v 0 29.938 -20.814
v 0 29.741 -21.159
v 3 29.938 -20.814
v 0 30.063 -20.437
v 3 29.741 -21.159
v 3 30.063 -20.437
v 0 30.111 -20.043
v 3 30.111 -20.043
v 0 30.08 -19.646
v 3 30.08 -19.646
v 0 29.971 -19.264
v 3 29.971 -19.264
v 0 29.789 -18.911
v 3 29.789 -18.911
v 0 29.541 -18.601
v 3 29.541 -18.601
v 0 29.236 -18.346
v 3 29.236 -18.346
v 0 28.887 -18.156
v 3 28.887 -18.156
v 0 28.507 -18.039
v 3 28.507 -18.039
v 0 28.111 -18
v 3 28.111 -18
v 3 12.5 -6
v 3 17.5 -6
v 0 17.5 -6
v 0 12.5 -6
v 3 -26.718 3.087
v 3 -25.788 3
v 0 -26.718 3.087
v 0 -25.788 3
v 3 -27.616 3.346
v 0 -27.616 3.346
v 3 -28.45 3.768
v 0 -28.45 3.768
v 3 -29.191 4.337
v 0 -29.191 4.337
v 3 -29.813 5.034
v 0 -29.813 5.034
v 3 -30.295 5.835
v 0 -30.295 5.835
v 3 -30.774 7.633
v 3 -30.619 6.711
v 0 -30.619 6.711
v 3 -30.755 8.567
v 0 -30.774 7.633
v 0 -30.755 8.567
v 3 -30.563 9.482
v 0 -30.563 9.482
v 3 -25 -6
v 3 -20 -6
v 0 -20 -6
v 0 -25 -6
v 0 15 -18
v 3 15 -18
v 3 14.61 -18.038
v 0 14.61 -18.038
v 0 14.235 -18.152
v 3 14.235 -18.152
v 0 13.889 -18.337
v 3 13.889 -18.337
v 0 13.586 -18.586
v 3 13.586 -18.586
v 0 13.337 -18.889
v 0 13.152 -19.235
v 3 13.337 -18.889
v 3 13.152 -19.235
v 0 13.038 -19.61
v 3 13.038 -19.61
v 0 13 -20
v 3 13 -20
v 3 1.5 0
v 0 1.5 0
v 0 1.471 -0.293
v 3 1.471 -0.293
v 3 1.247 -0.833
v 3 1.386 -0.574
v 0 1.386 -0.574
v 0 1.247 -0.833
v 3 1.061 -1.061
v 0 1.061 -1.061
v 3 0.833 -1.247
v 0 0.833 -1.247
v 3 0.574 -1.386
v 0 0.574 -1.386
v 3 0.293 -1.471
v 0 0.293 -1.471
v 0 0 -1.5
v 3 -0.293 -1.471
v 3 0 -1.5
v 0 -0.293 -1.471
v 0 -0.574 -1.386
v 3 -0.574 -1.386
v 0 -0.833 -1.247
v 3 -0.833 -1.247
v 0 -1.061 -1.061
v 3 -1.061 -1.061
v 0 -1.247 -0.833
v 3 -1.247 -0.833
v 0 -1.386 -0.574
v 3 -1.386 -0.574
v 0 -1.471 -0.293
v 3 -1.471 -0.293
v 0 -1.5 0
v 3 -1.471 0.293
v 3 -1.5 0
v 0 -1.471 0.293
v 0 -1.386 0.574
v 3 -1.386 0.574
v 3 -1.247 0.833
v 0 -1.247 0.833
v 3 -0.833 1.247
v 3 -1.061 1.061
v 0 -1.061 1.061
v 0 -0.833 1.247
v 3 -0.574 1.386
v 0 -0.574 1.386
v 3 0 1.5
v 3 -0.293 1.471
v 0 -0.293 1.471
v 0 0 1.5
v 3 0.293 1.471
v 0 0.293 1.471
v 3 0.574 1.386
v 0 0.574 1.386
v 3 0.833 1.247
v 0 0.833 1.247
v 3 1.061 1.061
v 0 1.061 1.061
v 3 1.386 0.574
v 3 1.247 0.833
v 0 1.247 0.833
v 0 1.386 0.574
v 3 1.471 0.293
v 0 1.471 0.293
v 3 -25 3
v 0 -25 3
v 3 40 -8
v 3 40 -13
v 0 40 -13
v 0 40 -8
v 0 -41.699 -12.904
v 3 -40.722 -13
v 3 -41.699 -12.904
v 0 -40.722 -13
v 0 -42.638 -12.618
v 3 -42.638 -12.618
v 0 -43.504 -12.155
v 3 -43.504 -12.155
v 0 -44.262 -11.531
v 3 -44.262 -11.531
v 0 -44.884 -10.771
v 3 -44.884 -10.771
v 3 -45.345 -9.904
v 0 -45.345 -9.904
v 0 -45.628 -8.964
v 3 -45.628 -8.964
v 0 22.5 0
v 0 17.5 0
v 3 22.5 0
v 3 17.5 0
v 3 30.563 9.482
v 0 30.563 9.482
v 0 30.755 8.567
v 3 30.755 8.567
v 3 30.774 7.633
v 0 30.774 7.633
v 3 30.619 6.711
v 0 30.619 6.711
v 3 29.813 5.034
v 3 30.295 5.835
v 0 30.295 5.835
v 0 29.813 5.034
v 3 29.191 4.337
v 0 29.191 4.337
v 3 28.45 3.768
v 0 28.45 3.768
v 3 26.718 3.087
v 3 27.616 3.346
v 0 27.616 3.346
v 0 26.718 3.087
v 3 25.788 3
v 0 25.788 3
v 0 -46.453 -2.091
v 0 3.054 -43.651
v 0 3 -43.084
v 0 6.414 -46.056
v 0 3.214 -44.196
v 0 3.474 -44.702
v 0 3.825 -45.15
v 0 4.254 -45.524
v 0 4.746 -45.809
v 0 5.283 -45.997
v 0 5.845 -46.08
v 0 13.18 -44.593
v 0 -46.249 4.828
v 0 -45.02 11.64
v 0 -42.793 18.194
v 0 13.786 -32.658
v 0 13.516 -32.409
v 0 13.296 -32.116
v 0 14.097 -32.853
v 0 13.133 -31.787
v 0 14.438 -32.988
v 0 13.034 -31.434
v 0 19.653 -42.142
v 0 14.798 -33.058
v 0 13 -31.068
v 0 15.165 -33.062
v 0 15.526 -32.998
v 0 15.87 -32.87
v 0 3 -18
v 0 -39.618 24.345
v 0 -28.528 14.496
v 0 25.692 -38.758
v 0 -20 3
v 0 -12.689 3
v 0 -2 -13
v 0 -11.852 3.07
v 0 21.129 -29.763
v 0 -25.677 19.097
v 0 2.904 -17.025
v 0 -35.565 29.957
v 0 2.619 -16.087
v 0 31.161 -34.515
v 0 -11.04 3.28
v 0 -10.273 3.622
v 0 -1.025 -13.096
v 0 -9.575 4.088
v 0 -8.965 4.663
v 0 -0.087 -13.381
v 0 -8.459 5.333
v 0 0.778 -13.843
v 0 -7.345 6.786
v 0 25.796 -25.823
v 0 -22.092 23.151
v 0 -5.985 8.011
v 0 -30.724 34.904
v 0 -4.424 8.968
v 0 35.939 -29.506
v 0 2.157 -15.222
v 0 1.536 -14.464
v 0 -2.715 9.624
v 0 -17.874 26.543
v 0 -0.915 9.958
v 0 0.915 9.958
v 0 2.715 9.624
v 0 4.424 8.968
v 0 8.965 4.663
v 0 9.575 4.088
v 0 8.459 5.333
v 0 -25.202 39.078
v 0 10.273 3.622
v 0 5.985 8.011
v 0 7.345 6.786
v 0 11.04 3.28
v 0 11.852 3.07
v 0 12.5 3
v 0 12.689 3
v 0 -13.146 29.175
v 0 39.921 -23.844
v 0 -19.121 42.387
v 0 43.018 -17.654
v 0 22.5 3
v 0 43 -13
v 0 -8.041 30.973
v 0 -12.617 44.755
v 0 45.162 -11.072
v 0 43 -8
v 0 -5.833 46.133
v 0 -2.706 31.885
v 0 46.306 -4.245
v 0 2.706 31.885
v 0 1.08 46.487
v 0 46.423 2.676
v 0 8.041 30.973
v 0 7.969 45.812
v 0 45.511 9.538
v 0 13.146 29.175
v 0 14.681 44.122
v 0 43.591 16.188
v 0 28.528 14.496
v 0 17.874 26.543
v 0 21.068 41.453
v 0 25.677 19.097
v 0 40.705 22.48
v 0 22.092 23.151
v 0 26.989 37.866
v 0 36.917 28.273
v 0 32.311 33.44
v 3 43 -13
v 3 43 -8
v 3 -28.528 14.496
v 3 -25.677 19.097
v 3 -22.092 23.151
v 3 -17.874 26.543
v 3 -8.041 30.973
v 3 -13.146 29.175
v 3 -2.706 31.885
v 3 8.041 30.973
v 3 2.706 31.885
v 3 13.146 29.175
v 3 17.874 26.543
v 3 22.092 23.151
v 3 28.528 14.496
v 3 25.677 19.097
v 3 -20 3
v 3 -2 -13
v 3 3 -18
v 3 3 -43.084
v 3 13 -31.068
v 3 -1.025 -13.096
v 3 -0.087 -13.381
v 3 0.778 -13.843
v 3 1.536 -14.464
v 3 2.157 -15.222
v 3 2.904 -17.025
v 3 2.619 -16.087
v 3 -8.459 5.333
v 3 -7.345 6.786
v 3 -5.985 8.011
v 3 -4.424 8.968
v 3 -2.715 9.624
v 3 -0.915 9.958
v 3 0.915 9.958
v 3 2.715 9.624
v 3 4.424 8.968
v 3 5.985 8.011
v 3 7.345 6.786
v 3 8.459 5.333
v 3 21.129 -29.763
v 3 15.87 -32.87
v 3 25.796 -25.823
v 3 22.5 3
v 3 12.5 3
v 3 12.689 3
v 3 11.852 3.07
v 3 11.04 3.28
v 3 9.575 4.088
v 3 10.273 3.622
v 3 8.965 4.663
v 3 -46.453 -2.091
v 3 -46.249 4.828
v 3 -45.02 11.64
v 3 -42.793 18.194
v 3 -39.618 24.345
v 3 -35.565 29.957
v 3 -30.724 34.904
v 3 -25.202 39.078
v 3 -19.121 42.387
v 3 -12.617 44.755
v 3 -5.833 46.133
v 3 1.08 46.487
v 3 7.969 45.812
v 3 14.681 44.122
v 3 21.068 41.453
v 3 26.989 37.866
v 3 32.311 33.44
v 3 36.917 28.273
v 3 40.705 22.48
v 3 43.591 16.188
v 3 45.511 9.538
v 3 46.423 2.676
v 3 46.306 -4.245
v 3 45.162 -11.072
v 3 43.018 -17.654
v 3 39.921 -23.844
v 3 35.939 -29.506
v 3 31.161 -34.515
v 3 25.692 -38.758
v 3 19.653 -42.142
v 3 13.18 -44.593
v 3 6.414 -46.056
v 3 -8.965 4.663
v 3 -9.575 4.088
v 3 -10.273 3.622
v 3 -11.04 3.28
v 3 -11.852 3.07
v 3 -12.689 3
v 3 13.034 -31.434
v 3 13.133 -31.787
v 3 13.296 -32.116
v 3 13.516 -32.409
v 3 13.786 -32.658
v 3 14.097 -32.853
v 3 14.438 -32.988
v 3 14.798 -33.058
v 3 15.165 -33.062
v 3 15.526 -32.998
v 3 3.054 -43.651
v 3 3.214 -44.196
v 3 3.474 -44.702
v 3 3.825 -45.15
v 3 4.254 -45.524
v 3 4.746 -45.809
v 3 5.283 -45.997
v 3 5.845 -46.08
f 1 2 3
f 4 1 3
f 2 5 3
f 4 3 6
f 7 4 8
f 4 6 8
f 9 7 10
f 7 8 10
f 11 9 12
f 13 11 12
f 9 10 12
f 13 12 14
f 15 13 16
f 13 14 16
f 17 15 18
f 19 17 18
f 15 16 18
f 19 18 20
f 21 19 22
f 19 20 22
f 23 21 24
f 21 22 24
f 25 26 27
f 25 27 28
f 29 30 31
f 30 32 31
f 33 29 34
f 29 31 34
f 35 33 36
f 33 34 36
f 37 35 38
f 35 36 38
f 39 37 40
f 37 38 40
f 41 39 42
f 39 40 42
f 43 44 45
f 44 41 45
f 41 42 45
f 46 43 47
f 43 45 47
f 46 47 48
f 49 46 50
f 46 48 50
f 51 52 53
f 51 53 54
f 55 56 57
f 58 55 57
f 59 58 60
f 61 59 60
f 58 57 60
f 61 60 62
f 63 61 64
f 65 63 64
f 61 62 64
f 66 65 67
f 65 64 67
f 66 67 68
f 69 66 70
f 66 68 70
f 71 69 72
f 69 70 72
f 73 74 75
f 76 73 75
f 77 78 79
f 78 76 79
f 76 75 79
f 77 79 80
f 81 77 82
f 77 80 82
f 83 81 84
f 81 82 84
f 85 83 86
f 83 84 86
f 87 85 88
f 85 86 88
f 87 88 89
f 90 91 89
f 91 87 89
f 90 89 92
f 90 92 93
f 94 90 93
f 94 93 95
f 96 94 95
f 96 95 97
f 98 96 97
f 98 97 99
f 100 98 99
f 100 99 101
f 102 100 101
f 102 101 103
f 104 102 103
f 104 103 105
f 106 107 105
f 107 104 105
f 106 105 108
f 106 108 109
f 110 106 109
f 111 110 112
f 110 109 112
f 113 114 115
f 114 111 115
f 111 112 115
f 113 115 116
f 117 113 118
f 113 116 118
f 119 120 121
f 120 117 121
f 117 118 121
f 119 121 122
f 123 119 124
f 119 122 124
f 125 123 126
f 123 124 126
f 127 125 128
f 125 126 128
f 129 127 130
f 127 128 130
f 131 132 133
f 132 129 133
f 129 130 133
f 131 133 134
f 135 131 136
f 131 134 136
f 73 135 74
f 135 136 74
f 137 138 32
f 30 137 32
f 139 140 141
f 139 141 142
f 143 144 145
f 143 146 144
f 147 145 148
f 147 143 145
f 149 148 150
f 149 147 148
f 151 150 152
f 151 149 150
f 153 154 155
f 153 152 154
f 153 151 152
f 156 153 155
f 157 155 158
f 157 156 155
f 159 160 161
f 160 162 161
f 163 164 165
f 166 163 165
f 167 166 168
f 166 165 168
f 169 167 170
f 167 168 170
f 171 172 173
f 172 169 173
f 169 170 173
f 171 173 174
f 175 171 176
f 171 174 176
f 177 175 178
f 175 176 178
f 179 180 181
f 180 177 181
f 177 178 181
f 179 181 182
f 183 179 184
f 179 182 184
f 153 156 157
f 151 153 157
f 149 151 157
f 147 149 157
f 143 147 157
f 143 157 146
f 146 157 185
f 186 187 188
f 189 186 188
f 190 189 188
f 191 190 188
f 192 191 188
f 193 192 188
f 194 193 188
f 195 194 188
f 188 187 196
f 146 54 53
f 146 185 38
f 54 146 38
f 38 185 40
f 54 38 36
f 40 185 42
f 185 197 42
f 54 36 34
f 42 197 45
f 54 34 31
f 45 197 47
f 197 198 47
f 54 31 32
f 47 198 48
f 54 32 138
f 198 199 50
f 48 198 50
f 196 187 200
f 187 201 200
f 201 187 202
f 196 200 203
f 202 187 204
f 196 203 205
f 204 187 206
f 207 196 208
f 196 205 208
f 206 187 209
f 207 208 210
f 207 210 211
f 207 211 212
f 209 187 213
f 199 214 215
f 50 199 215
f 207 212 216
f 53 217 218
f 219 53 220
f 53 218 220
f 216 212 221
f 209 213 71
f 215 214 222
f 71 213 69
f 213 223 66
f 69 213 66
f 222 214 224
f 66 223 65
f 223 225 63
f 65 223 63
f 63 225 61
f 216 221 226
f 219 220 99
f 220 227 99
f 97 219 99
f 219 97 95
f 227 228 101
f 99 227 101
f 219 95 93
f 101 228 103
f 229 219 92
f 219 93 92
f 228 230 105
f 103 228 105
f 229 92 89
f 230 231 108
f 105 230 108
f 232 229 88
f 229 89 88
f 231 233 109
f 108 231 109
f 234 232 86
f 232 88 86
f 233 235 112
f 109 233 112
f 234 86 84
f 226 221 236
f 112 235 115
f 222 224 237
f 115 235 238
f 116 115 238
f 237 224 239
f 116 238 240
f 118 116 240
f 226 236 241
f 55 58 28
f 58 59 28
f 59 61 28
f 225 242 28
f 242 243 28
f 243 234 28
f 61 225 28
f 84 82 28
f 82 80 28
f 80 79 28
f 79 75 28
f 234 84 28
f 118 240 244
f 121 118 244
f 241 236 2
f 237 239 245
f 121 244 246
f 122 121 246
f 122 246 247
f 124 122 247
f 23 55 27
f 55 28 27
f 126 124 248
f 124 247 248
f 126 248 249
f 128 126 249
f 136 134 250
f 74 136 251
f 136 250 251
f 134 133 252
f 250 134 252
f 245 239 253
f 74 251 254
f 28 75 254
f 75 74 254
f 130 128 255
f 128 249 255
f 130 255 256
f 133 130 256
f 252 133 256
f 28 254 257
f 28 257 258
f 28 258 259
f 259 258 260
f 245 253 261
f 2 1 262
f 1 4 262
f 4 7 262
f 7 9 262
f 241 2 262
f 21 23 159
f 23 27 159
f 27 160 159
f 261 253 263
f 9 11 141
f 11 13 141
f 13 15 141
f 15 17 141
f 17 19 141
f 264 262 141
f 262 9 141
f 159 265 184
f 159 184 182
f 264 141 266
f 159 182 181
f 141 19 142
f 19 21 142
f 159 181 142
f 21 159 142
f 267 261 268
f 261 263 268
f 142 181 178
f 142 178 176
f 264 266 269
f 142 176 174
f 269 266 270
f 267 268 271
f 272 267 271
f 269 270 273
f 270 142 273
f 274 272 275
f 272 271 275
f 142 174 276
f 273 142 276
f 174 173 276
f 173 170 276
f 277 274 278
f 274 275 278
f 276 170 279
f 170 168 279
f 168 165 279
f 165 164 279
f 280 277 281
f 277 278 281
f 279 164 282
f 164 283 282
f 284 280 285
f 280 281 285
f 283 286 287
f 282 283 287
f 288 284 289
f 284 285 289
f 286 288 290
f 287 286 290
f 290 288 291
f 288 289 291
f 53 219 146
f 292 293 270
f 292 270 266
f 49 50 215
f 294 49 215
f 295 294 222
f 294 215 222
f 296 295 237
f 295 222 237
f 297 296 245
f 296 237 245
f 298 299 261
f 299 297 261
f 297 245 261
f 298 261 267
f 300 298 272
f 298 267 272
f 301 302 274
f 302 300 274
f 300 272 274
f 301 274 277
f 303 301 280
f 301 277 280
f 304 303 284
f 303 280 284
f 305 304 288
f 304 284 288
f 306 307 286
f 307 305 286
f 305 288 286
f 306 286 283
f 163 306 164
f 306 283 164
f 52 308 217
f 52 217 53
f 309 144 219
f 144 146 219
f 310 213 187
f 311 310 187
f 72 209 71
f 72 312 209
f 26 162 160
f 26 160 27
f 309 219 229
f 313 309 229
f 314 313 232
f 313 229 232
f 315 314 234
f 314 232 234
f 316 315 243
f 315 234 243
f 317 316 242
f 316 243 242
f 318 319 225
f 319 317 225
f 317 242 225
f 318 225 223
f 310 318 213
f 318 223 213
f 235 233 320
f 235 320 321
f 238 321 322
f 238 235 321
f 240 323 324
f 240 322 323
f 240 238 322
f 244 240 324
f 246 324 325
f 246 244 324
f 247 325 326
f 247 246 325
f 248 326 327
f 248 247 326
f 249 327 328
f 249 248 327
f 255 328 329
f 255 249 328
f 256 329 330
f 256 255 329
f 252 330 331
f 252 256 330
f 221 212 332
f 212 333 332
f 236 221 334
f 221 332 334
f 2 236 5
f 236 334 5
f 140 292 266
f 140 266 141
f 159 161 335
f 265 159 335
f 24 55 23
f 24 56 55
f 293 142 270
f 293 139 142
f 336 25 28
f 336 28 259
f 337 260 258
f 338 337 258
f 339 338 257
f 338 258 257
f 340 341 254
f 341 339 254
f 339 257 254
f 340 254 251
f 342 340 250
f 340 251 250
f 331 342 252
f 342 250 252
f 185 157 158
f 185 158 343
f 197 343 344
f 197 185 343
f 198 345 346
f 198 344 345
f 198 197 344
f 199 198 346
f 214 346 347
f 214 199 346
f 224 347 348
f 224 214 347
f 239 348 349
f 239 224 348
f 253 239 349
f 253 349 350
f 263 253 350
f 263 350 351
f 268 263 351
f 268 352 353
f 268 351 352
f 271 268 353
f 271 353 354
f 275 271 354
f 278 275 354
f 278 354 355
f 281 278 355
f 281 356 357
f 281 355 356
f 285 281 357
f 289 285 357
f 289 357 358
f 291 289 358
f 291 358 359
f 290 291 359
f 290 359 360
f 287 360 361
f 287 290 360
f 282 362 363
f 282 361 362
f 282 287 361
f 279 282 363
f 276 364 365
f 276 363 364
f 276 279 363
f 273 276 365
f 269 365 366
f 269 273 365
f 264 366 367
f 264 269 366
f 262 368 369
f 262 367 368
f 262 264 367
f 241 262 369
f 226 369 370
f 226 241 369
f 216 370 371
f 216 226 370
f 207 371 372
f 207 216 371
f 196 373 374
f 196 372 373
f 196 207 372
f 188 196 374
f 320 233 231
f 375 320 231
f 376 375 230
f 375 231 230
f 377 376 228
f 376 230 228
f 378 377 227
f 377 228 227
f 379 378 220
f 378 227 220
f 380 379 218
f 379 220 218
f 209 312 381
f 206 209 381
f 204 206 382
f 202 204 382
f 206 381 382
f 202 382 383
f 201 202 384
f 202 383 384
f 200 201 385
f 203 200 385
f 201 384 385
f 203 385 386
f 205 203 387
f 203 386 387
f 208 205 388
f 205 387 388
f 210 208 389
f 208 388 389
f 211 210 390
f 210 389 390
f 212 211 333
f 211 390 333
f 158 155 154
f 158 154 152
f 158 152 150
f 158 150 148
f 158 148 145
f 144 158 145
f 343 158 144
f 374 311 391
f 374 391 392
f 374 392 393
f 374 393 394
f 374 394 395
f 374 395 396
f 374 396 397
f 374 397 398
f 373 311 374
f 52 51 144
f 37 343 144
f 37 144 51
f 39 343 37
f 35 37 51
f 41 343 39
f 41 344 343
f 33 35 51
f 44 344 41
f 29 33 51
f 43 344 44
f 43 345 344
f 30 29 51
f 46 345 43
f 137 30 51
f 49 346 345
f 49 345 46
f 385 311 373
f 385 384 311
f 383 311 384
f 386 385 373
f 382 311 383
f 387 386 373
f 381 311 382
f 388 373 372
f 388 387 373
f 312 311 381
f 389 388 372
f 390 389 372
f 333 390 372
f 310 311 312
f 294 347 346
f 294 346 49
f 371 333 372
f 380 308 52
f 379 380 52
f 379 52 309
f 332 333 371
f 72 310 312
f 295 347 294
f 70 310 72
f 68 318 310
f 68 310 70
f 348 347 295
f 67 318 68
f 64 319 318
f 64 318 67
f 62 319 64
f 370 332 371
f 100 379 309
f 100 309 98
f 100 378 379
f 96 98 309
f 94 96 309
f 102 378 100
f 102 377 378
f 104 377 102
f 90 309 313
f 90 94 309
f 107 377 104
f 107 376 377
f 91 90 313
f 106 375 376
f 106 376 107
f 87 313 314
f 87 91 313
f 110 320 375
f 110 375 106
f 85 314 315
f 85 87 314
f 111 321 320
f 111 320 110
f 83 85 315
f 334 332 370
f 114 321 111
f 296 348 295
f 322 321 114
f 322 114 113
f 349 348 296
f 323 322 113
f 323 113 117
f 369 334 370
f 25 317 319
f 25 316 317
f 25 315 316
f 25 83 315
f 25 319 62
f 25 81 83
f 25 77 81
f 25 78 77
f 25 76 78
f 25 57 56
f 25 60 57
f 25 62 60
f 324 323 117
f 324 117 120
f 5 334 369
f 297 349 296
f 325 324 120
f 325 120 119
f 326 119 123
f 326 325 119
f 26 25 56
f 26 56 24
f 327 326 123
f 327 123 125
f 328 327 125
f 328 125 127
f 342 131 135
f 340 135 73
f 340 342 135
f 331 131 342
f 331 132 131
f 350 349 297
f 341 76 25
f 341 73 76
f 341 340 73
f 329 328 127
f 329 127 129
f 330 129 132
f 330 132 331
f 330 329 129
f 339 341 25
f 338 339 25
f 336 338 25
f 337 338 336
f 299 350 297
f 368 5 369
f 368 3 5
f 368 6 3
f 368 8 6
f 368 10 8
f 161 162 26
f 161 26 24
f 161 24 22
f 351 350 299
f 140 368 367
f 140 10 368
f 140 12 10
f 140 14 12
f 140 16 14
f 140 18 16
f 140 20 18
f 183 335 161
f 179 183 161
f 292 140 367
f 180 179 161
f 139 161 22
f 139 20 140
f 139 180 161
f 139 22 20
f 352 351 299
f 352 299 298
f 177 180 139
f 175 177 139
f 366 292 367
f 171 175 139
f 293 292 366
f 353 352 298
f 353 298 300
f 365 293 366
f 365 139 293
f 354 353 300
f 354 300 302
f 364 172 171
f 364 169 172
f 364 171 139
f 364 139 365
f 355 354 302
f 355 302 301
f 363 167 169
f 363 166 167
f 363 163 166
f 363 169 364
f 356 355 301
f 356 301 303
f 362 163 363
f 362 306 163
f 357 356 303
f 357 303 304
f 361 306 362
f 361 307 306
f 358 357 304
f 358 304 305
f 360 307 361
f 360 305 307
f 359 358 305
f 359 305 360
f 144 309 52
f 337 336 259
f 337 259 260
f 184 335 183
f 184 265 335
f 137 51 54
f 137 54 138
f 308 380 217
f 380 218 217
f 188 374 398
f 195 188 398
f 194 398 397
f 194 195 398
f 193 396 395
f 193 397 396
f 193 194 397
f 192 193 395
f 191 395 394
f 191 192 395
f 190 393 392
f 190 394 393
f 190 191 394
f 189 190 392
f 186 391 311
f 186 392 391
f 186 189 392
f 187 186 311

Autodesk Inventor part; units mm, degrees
ref_plane "YZ Plane" through (0, 0, 0) normal (1, 0, 0) x (0, 1, 0)
ref_plane "XZ Plane" through (0, 0, 0) normal (0, 1, 0) x (-1, 0, 0)
ref_plane "XY Plane" through (0, 0, 0) normal (0, 0, 1) x (1, 0, 0)
sketch "Sketch1" plane through (0, 0, 0) normal (1, 0, 0) x (0, 1, 0)
  line L0 (-40.7216, -13) -> (-2, -13)
  arc A0 (30.5631, 9.4815) -> (-30.5631, 9.4815) centre (0, 0) ccw
  arc A1 (8.4591, 5.3333) -> (-8.4591, 5.3333) centre (0, 0) ccw
  circle A2 centre (0, 0) radius 1.5
  line L1 (3, -18) -> (3, -43.0842)
  arc A3 (3, -18) -> (-2, -13) centre (-2, -18) ccw
  arc A4 (6.4138, -46.0555) -> (-45.6278, -8.9639) centre (0, 0) ccw
  line L2 (-12.6886, 3) -> (-25.7876, 3)
  line L3 (12.6886, 3) -> (25.7876, 3)
  arc A5 (-30.5631, 9.4815) -> (-25.7876, 3) centre (-25.7876, 8) ccw
  arc A6 (-12.6886, 3) -> (-8.4591, 5.3333) centre (-12.6886, 8) ccw
  arc A7 (8.4591, 5.3333) -> (12.6886, 3) centre (12.6886, 8) ccw
  arc A8 (25.7876, 3) -> (30.5631, 9.4815) centre (25.7876, 8) ccw
  arc A9 (-45.6278, -8.9639) -> (-40.7216, -13) centre (-40.7216, -8) ccw
  arc A10 (3, -43.0842) -> (6.4138, -46.0555) centre (6, -43.0842) ccw
  point P0 (-44.6458, -13)
  point P1 (3, -13)
  point P2 (-10, 0)
  point P3 (10, 0)
  point P4 (-9.5394, 3)
  point P5 (9.5394, 3)
  point P6 (3, -31.881)
  point P7 (3, -46.4031)
  point P8 (-31.8591, 3)
  point P9 (31.8591, 3)
  dimension "d5" = 32
  dimension "d6" = 20
  dimension "d7" = 3
  dimension "d52" = 3
  dimension "d53" = 3
  dimension "d54" = 5
  dimension "d66" = 46.5
  dimension "d78" = 16
  dimension "d79" = 5
  dimension "d80" = 3
  dimension "d81" = 3
  dimension "d82" = 5
extrude "Extrusion3" add sketch "Sketch1" along normal blind 3
sketch "Sketch2" plane through (3, 0, 0) normal (1, 0, 0) x (0, 0, -1)
  arc A0 (-9.4815, 30.5631) -> (-9.4815, -30.5631) centre (0, 0) ccw projected
  line L0 (8, 43) -> (13, 43)
  line L1 (13, 43) -> (13, 40)
  line L2 (13, 40) -> (8, 40)
  line L3 (8, 40) -> (8, 43)
  dimension "d38" = 3
  dimension "d41" = 40
  dimension "d42" = 8
  dimension "d43" = 5
extrude "Extrusion5" cut sketch "Sketch2" against normal through all
sketch "Sketch4" plane through (3, 0, 0) normal (1, 0, 0) x (0, 0, -1)
  arc A0 (-9.4815, 30.5631) -> (-9.4815, -30.5631) centre (0, 0) ccw projected
  line L0 (-3, 25.7876) -> (-3, 12.6886) projected
  line L1 (-3, -12.6886) -> (-3, -25.7876) projected
  line L2 (-3, -20) -> (6, -20)
  line L3 (6, -20) -> (6, -25)
  line L4 (6, -25) -> (-3, -25)
  line L5 (-3, -25) -> (-3, -20)
  line L6 (-3, 17.5) -> (6, 17.5)
  line L7 (6, 17.5) -> (6, 12.5)
  line L8 (6, 12.5) -> (-3, 12.5)
  line L9 (-3, 12.5) -> (-3, 17.5)
  dimension "d57" = 9
  dimension "d59" = 5
  dimension "d60" = 20
  dimension "d61" = 9
  dimension "d62" = 5
  dimension "d63" = 12.5
extrude "Extrusion6" cut sketch "Sketch4" against normal through all
sketch "Sketch5" plane through (3, 0, 0) normal (1, 0, 0) x (0, 0, -1)
  line L0 (-3, 17.5) -> (0, 17.5)
  line L1 (0, 17.5) -> (0, 22.5)
  line L2 (0, 22.5) -> (-3, 22.5)
  line L3 (-3, 22.5) -> (-3, 17.5)
  point P0 (0, 0)
  dimension "d67" = 5
  dimension "d68" = 3
extrude "Extrusion7" cut sketch "Sketch5" against normal through all
sketch "Sketch6" plane through (3, 0, 0) normal (1, 0, 0) x (0, 0, -1)
  circle A0 centre (0, 0) radius 1.5 projected
  arc A1 (32.8695, 15.8696) -> (21.1594, 29.741) centre (0, 0) ccw
  line L0 (31.0685, 13) -> (20, 13)
  line L1 (18, 15) -> (18, 28.1114)
  line L2 (18, 3) -> (43.0842, 3) projected
  line L3 (13, -40.7216) -> (13, -2) projected
  arc A2 (31.0685, 13) -> (32.8695, 15.8696) centre (31.0685, 15) ccw
  arc A3 (21.1594, 29.741) -> (18, 28.1114) centre (20, 28.1114) ccw
  arc A4 (18, 15) -> (20, 13) centre (20, 15) ccw
  point P0 (41.1696, 0.4856)
  point P1 (14.881, -40.3065)
  point P2 (14.881, -4.5144)
  point P3 (18, 31.753)
  point P4 (34.1065, 13)
  point P5 (43.0842, 3)
  point P6 (13, -2)
  dimension "d72" = 73
  dimension "d73" = 10
  dimension "d74" = 5
  dimension "d75" = 2
extrude "Extrusion8" cut sketch "Sketch6" against normal through all contours A2 L0 A4 L1 A3 A1
properties part number "EChasisSide2"
